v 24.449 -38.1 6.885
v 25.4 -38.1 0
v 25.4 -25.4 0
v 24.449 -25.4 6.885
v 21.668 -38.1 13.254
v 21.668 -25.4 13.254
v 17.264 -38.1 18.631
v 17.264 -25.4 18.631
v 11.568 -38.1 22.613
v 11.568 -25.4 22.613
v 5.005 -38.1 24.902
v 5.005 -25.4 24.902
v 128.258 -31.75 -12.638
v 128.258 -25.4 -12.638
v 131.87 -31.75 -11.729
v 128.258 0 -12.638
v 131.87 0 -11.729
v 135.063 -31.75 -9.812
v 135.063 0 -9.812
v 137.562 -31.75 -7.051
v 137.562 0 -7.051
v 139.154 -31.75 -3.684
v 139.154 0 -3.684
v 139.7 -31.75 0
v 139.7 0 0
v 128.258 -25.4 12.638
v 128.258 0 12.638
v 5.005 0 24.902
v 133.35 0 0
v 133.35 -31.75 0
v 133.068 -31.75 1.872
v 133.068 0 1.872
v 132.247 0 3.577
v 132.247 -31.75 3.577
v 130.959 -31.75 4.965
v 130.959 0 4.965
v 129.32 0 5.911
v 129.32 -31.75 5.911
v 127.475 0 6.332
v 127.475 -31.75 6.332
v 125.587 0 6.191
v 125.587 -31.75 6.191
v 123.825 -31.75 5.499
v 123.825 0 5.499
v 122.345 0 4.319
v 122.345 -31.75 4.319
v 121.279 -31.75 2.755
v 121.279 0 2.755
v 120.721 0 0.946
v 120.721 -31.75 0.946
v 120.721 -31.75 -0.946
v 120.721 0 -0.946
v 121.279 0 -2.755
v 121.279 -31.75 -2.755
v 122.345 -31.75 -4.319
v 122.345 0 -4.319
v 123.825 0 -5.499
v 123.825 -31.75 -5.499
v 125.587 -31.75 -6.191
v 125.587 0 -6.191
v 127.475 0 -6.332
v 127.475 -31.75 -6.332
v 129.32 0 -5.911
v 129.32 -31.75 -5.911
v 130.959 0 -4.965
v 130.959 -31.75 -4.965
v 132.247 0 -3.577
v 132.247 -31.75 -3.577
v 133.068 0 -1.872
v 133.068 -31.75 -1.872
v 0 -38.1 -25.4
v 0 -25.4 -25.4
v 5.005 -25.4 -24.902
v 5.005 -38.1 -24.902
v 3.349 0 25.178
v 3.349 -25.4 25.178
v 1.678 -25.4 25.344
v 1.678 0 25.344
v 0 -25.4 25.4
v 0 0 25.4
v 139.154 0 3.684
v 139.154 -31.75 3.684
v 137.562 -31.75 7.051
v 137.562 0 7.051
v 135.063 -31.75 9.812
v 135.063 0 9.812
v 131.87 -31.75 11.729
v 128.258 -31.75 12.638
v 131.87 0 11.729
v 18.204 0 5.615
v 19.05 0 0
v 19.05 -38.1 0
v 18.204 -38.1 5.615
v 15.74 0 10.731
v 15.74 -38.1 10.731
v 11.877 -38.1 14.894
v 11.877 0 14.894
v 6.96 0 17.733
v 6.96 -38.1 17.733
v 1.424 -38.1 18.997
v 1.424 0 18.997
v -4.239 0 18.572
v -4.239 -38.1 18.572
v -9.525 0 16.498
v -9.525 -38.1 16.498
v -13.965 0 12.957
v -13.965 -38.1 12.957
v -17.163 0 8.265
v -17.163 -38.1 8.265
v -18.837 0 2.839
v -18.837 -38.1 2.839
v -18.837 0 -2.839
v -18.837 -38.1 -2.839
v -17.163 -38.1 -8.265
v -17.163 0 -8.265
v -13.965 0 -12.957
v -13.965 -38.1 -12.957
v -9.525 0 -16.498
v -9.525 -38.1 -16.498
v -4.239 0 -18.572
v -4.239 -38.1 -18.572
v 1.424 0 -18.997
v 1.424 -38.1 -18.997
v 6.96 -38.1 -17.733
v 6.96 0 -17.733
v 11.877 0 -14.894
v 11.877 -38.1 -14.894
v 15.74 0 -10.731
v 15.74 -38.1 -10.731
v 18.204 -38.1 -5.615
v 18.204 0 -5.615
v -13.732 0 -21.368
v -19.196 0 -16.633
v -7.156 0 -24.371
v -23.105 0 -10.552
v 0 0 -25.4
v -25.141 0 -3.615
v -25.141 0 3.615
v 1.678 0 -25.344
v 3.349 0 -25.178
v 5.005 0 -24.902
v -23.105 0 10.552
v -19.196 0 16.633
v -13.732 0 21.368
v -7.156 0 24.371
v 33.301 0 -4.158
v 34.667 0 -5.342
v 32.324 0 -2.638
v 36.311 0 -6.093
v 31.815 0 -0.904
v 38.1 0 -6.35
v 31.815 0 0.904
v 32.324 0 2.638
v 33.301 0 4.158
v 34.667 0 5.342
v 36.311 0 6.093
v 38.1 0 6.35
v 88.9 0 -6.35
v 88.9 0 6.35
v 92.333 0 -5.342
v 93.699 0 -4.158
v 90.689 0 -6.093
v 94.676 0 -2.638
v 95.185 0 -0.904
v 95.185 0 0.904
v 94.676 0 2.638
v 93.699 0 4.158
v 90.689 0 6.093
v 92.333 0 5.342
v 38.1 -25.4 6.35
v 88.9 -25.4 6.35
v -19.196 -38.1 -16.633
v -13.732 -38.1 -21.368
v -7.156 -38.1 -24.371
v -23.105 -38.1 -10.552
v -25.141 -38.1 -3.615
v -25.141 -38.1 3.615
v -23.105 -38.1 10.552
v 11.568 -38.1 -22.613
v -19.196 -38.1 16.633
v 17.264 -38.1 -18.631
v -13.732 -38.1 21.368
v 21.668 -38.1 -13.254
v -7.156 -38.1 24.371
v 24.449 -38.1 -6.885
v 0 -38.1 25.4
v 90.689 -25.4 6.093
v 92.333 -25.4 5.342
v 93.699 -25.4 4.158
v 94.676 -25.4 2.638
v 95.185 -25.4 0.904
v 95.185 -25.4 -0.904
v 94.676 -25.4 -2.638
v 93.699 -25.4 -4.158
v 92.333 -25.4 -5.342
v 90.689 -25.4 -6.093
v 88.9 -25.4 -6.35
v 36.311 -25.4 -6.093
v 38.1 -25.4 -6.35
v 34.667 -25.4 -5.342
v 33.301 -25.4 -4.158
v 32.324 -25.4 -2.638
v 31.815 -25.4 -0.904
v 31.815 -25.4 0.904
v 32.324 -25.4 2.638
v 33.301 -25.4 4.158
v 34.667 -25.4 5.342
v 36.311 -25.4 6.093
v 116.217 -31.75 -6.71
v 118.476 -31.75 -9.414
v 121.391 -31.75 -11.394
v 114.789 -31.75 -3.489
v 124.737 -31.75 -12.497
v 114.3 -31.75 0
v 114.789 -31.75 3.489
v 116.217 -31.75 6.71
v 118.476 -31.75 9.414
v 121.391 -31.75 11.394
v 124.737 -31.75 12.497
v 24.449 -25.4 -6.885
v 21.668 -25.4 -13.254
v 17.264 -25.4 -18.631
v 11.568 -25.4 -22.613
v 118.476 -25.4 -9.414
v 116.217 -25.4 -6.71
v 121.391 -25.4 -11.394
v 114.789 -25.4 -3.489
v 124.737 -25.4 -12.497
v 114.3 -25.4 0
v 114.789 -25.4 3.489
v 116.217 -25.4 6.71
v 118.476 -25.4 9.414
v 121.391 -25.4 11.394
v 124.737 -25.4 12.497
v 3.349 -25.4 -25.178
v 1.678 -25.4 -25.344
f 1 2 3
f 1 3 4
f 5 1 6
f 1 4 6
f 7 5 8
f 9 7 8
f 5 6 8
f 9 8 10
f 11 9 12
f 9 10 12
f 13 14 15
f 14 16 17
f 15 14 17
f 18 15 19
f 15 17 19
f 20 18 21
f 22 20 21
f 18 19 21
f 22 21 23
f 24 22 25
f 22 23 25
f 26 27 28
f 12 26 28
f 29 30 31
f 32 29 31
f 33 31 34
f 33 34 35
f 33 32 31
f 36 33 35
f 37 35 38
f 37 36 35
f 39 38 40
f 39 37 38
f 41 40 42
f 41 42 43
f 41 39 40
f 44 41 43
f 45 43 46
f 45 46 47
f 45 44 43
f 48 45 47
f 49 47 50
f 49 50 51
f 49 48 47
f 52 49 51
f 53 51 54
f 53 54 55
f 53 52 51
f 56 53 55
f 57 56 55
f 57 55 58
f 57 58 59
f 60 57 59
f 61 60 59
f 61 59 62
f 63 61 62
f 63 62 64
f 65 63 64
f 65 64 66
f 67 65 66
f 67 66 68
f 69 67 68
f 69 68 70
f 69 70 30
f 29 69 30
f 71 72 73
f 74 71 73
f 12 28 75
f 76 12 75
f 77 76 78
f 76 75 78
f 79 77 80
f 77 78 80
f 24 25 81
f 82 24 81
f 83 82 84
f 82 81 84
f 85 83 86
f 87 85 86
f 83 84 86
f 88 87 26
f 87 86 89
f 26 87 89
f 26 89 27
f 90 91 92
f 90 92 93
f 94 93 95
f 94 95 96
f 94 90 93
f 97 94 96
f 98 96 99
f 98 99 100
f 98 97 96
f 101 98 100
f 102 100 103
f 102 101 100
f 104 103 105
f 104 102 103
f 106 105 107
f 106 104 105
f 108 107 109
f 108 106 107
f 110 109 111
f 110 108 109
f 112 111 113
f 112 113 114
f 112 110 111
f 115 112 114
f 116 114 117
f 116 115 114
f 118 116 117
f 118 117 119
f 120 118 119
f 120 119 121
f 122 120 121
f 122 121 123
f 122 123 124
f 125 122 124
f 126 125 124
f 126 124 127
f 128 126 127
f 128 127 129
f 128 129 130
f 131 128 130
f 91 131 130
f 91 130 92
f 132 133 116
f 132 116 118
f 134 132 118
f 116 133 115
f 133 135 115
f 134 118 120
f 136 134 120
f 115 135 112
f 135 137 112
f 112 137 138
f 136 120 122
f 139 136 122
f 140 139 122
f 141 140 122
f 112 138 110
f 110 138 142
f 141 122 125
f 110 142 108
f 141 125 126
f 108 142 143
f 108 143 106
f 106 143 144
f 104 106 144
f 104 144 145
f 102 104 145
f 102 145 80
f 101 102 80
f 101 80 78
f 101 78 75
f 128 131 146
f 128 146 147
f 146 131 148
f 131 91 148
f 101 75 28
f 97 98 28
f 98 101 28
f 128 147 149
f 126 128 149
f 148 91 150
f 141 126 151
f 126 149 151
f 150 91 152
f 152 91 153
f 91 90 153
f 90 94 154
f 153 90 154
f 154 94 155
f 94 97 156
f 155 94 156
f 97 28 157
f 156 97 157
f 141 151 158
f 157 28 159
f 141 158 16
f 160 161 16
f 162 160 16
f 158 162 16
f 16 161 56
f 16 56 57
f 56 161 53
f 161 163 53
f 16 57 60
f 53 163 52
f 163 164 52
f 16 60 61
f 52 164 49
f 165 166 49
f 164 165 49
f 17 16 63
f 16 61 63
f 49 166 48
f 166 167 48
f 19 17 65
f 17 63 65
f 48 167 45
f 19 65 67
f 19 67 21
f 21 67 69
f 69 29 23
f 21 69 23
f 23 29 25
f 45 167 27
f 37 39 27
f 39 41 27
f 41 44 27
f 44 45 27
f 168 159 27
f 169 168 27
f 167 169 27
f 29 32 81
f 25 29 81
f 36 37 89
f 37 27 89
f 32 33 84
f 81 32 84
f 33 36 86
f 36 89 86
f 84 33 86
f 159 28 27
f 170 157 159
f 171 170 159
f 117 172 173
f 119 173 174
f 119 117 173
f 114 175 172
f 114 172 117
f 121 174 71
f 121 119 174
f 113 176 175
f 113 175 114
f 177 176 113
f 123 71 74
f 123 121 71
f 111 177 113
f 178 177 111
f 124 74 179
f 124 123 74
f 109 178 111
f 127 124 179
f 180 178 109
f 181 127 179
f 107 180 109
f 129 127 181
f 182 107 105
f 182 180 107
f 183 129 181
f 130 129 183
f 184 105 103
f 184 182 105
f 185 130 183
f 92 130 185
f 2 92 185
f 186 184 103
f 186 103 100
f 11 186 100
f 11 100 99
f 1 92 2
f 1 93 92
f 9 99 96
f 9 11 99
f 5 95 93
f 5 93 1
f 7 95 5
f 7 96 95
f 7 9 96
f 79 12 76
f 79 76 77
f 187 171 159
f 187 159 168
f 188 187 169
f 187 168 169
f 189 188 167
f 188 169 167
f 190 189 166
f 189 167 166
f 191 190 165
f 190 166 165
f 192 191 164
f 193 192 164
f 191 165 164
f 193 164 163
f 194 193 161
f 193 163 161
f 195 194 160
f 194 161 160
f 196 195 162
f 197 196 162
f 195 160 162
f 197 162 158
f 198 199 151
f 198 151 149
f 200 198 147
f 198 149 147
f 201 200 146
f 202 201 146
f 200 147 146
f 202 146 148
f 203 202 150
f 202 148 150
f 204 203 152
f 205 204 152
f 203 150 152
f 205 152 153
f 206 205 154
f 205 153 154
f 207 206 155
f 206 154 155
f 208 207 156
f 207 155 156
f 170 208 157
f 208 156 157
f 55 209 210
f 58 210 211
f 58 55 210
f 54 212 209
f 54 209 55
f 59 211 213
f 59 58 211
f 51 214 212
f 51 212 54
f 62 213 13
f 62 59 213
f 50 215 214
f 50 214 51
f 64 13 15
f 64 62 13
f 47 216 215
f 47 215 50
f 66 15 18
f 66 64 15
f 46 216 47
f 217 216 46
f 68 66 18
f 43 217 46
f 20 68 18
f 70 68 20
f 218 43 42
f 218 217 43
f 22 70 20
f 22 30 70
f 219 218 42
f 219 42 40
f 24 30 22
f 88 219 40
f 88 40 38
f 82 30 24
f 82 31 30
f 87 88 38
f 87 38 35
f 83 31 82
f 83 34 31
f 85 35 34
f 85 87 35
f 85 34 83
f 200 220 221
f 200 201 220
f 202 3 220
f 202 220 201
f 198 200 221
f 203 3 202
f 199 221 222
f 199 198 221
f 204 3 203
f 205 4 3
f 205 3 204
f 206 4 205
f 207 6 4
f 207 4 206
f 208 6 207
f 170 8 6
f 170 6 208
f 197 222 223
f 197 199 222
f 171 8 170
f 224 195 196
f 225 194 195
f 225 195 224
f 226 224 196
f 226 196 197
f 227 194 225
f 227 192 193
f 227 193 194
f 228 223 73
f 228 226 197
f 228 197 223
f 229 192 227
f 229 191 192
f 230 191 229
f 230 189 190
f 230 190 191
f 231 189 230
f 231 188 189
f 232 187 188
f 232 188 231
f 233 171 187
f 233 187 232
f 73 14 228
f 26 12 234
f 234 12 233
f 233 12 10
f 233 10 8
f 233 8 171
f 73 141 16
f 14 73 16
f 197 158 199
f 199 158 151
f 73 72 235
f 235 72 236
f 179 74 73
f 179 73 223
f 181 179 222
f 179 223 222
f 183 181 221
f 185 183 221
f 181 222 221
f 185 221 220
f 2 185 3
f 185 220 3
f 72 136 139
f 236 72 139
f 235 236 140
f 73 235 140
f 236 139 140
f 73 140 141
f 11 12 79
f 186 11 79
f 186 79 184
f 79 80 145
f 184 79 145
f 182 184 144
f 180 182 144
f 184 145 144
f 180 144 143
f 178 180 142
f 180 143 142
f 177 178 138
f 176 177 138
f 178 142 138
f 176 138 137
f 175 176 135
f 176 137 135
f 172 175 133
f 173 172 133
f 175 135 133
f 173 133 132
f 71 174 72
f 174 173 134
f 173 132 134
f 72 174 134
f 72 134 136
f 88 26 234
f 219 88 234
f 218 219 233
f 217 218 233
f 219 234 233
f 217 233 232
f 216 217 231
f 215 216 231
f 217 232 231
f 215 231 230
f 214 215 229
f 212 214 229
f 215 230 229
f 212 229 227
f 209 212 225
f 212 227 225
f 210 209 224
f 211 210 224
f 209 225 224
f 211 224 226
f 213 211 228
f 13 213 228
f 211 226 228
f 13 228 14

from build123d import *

# Parameters (mm, degrees)
F0_R     = 19.05
F1_DEPTH = 38.1
F0_R_2   = 6.35
F2_DEPTH = 31.75
F3_DEPTH = 25.4


with BuildPart() as f1:
    # F0 (on Front) → F1 (new body)
    with BuildSketch(Plane.XZ):
        with BuildLine():
            ThreePointArc((25.4, 0), (19.650648, 16.093851), (5.005352, 24.901937))
            Line((5.005352, 24.901937), (0, 25.4))
            ThreePointArc((0, 25.4), (-25.4, 0), (0, -25.4))
            Line((0, -25.4), (5.005352, -24.901937))
            ThreePointArc((5.005352, -24.901937), (19.650648, -16.093851), (25.4, 0))
        make_face()
        Circle(F0_R, mode=Mode.SUBTRACT)
    extrude(amount=F1_DEPTH)

    # F0 (on Front) → F2 (join)
    with BuildSketch(Plane.XZ):
        with BuildLine():
            ThreePointArc((25.4, 0), (19.650648, 16.093851), (5.005352, 24.901937))
            Line((5.005352, 24.901937), (0, 25.4))
            ThreePointArc((0, 25.4), (-25.4, 0), (0, -25.4))
            Line((0, -25.4), (5.005352, -24.901937))
            ThreePointArc((5.005352, -24.901937), (19.650648, -16.093851), (25.4, 0))
        make_face()
        Circle(F0_R, mode=Mode.SUBTRACT)
        with BuildLine():
            ThreePointArc((128.257518, -12.637589), (136.414363, -8.52407), (139.7, 0))
            ThreePointArc((139.7, 0), (136.414363, 8.52407), (128.257518, 12.637589))
            ThreePointArc((128.257518, 12.637589), (114.3, 0), (128.257518, -12.637589))
        make_face()
        with Locations((127, 0)):
            Circle(F0_R_2, mode=Mode.SUBTRACT)
    extrude(amount=F2_DEPTH)

    # F0 (on Front) → F3 (join)
    with BuildSketch(Plane.XZ):
        with BuildLine():
            ThreePointArc((128.257518, -12.637589), (136.414363, -8.52407), (139.7, 0))
            ThreePointArc((139.7, 0), (136.414363, 8.52407), (128.257518, 12.637589))
            ThreePointArc((128.257518, 12.637589), (114.3, 0), (128.257518, -12.637589))
        make_face()
        with Locations((127, 0)):
            Circle(F0_R_2, mode=Mode.SUBTRACT)
        with BuildLine():
            ThreePointArc((128.257518, -12.637589), (114.3, 0), (128.257518, 12.637589))
            Line((128.257518, 12.637589), (5.005352, 24.901937))
            ThreePointArc((5.005352, 24.901937), (19.650648, 16.093851), (25.4, 0))
            ThreePointArc((25.4, 0), (19.650648, -16.093851), (5.005352, -24.901937))
            Line((5.005352, -24.901937), (128.257518, -12.637589))
        make_face()
        with BuildLine():
            ThreePointArc((38.1, -6.35), (31.75, 0), (38.1, 6.35))
            Line((38.1, 6.35), (88.9, 6.35))
            ThreePointArc((88.9, 6.35), (95.25, 0), (88.9, -6.35))
            Line((88.9, -6.35), (38.1, -6.35))
        make_face(mode=Mode.SUBTRACT)
        with BuildLine():
            Line((0, 25.4), (5.005352, 24.901937))
            ThreePointArc((5.005352, 24.901937), (2.515035, 25.275177), (0, 25.4))
        make_face()
        with BuildLine():
            ThreePointArc((25.4, 0), (19.650648, 16.093851), (5.005352, 24.901937))
            Line((5.005352, 24.901937), (0, 25.4))
            ThreePointArc((0, 25.4), (-25.4, 0), (0, -25.4))
            Line((0, -25.4), (5.005352, -24.901937))
            ThreePointArc((5.005352, -24.901937), (19.650648, -16.093851), (25.4, 0))
        make_face()
        Circle(F0_R, mode=Mode.SUBTRACT)
        with BuildLine():
            ThreePointArc((0, -25.4), (2.515035, -25.275177), (5.005352, -24.901937))
            Line((5.005352, -24.901937), (0, -25.4))
        make_face()
    extrude(amount=F3_DEPTH)


solid = f1.part
